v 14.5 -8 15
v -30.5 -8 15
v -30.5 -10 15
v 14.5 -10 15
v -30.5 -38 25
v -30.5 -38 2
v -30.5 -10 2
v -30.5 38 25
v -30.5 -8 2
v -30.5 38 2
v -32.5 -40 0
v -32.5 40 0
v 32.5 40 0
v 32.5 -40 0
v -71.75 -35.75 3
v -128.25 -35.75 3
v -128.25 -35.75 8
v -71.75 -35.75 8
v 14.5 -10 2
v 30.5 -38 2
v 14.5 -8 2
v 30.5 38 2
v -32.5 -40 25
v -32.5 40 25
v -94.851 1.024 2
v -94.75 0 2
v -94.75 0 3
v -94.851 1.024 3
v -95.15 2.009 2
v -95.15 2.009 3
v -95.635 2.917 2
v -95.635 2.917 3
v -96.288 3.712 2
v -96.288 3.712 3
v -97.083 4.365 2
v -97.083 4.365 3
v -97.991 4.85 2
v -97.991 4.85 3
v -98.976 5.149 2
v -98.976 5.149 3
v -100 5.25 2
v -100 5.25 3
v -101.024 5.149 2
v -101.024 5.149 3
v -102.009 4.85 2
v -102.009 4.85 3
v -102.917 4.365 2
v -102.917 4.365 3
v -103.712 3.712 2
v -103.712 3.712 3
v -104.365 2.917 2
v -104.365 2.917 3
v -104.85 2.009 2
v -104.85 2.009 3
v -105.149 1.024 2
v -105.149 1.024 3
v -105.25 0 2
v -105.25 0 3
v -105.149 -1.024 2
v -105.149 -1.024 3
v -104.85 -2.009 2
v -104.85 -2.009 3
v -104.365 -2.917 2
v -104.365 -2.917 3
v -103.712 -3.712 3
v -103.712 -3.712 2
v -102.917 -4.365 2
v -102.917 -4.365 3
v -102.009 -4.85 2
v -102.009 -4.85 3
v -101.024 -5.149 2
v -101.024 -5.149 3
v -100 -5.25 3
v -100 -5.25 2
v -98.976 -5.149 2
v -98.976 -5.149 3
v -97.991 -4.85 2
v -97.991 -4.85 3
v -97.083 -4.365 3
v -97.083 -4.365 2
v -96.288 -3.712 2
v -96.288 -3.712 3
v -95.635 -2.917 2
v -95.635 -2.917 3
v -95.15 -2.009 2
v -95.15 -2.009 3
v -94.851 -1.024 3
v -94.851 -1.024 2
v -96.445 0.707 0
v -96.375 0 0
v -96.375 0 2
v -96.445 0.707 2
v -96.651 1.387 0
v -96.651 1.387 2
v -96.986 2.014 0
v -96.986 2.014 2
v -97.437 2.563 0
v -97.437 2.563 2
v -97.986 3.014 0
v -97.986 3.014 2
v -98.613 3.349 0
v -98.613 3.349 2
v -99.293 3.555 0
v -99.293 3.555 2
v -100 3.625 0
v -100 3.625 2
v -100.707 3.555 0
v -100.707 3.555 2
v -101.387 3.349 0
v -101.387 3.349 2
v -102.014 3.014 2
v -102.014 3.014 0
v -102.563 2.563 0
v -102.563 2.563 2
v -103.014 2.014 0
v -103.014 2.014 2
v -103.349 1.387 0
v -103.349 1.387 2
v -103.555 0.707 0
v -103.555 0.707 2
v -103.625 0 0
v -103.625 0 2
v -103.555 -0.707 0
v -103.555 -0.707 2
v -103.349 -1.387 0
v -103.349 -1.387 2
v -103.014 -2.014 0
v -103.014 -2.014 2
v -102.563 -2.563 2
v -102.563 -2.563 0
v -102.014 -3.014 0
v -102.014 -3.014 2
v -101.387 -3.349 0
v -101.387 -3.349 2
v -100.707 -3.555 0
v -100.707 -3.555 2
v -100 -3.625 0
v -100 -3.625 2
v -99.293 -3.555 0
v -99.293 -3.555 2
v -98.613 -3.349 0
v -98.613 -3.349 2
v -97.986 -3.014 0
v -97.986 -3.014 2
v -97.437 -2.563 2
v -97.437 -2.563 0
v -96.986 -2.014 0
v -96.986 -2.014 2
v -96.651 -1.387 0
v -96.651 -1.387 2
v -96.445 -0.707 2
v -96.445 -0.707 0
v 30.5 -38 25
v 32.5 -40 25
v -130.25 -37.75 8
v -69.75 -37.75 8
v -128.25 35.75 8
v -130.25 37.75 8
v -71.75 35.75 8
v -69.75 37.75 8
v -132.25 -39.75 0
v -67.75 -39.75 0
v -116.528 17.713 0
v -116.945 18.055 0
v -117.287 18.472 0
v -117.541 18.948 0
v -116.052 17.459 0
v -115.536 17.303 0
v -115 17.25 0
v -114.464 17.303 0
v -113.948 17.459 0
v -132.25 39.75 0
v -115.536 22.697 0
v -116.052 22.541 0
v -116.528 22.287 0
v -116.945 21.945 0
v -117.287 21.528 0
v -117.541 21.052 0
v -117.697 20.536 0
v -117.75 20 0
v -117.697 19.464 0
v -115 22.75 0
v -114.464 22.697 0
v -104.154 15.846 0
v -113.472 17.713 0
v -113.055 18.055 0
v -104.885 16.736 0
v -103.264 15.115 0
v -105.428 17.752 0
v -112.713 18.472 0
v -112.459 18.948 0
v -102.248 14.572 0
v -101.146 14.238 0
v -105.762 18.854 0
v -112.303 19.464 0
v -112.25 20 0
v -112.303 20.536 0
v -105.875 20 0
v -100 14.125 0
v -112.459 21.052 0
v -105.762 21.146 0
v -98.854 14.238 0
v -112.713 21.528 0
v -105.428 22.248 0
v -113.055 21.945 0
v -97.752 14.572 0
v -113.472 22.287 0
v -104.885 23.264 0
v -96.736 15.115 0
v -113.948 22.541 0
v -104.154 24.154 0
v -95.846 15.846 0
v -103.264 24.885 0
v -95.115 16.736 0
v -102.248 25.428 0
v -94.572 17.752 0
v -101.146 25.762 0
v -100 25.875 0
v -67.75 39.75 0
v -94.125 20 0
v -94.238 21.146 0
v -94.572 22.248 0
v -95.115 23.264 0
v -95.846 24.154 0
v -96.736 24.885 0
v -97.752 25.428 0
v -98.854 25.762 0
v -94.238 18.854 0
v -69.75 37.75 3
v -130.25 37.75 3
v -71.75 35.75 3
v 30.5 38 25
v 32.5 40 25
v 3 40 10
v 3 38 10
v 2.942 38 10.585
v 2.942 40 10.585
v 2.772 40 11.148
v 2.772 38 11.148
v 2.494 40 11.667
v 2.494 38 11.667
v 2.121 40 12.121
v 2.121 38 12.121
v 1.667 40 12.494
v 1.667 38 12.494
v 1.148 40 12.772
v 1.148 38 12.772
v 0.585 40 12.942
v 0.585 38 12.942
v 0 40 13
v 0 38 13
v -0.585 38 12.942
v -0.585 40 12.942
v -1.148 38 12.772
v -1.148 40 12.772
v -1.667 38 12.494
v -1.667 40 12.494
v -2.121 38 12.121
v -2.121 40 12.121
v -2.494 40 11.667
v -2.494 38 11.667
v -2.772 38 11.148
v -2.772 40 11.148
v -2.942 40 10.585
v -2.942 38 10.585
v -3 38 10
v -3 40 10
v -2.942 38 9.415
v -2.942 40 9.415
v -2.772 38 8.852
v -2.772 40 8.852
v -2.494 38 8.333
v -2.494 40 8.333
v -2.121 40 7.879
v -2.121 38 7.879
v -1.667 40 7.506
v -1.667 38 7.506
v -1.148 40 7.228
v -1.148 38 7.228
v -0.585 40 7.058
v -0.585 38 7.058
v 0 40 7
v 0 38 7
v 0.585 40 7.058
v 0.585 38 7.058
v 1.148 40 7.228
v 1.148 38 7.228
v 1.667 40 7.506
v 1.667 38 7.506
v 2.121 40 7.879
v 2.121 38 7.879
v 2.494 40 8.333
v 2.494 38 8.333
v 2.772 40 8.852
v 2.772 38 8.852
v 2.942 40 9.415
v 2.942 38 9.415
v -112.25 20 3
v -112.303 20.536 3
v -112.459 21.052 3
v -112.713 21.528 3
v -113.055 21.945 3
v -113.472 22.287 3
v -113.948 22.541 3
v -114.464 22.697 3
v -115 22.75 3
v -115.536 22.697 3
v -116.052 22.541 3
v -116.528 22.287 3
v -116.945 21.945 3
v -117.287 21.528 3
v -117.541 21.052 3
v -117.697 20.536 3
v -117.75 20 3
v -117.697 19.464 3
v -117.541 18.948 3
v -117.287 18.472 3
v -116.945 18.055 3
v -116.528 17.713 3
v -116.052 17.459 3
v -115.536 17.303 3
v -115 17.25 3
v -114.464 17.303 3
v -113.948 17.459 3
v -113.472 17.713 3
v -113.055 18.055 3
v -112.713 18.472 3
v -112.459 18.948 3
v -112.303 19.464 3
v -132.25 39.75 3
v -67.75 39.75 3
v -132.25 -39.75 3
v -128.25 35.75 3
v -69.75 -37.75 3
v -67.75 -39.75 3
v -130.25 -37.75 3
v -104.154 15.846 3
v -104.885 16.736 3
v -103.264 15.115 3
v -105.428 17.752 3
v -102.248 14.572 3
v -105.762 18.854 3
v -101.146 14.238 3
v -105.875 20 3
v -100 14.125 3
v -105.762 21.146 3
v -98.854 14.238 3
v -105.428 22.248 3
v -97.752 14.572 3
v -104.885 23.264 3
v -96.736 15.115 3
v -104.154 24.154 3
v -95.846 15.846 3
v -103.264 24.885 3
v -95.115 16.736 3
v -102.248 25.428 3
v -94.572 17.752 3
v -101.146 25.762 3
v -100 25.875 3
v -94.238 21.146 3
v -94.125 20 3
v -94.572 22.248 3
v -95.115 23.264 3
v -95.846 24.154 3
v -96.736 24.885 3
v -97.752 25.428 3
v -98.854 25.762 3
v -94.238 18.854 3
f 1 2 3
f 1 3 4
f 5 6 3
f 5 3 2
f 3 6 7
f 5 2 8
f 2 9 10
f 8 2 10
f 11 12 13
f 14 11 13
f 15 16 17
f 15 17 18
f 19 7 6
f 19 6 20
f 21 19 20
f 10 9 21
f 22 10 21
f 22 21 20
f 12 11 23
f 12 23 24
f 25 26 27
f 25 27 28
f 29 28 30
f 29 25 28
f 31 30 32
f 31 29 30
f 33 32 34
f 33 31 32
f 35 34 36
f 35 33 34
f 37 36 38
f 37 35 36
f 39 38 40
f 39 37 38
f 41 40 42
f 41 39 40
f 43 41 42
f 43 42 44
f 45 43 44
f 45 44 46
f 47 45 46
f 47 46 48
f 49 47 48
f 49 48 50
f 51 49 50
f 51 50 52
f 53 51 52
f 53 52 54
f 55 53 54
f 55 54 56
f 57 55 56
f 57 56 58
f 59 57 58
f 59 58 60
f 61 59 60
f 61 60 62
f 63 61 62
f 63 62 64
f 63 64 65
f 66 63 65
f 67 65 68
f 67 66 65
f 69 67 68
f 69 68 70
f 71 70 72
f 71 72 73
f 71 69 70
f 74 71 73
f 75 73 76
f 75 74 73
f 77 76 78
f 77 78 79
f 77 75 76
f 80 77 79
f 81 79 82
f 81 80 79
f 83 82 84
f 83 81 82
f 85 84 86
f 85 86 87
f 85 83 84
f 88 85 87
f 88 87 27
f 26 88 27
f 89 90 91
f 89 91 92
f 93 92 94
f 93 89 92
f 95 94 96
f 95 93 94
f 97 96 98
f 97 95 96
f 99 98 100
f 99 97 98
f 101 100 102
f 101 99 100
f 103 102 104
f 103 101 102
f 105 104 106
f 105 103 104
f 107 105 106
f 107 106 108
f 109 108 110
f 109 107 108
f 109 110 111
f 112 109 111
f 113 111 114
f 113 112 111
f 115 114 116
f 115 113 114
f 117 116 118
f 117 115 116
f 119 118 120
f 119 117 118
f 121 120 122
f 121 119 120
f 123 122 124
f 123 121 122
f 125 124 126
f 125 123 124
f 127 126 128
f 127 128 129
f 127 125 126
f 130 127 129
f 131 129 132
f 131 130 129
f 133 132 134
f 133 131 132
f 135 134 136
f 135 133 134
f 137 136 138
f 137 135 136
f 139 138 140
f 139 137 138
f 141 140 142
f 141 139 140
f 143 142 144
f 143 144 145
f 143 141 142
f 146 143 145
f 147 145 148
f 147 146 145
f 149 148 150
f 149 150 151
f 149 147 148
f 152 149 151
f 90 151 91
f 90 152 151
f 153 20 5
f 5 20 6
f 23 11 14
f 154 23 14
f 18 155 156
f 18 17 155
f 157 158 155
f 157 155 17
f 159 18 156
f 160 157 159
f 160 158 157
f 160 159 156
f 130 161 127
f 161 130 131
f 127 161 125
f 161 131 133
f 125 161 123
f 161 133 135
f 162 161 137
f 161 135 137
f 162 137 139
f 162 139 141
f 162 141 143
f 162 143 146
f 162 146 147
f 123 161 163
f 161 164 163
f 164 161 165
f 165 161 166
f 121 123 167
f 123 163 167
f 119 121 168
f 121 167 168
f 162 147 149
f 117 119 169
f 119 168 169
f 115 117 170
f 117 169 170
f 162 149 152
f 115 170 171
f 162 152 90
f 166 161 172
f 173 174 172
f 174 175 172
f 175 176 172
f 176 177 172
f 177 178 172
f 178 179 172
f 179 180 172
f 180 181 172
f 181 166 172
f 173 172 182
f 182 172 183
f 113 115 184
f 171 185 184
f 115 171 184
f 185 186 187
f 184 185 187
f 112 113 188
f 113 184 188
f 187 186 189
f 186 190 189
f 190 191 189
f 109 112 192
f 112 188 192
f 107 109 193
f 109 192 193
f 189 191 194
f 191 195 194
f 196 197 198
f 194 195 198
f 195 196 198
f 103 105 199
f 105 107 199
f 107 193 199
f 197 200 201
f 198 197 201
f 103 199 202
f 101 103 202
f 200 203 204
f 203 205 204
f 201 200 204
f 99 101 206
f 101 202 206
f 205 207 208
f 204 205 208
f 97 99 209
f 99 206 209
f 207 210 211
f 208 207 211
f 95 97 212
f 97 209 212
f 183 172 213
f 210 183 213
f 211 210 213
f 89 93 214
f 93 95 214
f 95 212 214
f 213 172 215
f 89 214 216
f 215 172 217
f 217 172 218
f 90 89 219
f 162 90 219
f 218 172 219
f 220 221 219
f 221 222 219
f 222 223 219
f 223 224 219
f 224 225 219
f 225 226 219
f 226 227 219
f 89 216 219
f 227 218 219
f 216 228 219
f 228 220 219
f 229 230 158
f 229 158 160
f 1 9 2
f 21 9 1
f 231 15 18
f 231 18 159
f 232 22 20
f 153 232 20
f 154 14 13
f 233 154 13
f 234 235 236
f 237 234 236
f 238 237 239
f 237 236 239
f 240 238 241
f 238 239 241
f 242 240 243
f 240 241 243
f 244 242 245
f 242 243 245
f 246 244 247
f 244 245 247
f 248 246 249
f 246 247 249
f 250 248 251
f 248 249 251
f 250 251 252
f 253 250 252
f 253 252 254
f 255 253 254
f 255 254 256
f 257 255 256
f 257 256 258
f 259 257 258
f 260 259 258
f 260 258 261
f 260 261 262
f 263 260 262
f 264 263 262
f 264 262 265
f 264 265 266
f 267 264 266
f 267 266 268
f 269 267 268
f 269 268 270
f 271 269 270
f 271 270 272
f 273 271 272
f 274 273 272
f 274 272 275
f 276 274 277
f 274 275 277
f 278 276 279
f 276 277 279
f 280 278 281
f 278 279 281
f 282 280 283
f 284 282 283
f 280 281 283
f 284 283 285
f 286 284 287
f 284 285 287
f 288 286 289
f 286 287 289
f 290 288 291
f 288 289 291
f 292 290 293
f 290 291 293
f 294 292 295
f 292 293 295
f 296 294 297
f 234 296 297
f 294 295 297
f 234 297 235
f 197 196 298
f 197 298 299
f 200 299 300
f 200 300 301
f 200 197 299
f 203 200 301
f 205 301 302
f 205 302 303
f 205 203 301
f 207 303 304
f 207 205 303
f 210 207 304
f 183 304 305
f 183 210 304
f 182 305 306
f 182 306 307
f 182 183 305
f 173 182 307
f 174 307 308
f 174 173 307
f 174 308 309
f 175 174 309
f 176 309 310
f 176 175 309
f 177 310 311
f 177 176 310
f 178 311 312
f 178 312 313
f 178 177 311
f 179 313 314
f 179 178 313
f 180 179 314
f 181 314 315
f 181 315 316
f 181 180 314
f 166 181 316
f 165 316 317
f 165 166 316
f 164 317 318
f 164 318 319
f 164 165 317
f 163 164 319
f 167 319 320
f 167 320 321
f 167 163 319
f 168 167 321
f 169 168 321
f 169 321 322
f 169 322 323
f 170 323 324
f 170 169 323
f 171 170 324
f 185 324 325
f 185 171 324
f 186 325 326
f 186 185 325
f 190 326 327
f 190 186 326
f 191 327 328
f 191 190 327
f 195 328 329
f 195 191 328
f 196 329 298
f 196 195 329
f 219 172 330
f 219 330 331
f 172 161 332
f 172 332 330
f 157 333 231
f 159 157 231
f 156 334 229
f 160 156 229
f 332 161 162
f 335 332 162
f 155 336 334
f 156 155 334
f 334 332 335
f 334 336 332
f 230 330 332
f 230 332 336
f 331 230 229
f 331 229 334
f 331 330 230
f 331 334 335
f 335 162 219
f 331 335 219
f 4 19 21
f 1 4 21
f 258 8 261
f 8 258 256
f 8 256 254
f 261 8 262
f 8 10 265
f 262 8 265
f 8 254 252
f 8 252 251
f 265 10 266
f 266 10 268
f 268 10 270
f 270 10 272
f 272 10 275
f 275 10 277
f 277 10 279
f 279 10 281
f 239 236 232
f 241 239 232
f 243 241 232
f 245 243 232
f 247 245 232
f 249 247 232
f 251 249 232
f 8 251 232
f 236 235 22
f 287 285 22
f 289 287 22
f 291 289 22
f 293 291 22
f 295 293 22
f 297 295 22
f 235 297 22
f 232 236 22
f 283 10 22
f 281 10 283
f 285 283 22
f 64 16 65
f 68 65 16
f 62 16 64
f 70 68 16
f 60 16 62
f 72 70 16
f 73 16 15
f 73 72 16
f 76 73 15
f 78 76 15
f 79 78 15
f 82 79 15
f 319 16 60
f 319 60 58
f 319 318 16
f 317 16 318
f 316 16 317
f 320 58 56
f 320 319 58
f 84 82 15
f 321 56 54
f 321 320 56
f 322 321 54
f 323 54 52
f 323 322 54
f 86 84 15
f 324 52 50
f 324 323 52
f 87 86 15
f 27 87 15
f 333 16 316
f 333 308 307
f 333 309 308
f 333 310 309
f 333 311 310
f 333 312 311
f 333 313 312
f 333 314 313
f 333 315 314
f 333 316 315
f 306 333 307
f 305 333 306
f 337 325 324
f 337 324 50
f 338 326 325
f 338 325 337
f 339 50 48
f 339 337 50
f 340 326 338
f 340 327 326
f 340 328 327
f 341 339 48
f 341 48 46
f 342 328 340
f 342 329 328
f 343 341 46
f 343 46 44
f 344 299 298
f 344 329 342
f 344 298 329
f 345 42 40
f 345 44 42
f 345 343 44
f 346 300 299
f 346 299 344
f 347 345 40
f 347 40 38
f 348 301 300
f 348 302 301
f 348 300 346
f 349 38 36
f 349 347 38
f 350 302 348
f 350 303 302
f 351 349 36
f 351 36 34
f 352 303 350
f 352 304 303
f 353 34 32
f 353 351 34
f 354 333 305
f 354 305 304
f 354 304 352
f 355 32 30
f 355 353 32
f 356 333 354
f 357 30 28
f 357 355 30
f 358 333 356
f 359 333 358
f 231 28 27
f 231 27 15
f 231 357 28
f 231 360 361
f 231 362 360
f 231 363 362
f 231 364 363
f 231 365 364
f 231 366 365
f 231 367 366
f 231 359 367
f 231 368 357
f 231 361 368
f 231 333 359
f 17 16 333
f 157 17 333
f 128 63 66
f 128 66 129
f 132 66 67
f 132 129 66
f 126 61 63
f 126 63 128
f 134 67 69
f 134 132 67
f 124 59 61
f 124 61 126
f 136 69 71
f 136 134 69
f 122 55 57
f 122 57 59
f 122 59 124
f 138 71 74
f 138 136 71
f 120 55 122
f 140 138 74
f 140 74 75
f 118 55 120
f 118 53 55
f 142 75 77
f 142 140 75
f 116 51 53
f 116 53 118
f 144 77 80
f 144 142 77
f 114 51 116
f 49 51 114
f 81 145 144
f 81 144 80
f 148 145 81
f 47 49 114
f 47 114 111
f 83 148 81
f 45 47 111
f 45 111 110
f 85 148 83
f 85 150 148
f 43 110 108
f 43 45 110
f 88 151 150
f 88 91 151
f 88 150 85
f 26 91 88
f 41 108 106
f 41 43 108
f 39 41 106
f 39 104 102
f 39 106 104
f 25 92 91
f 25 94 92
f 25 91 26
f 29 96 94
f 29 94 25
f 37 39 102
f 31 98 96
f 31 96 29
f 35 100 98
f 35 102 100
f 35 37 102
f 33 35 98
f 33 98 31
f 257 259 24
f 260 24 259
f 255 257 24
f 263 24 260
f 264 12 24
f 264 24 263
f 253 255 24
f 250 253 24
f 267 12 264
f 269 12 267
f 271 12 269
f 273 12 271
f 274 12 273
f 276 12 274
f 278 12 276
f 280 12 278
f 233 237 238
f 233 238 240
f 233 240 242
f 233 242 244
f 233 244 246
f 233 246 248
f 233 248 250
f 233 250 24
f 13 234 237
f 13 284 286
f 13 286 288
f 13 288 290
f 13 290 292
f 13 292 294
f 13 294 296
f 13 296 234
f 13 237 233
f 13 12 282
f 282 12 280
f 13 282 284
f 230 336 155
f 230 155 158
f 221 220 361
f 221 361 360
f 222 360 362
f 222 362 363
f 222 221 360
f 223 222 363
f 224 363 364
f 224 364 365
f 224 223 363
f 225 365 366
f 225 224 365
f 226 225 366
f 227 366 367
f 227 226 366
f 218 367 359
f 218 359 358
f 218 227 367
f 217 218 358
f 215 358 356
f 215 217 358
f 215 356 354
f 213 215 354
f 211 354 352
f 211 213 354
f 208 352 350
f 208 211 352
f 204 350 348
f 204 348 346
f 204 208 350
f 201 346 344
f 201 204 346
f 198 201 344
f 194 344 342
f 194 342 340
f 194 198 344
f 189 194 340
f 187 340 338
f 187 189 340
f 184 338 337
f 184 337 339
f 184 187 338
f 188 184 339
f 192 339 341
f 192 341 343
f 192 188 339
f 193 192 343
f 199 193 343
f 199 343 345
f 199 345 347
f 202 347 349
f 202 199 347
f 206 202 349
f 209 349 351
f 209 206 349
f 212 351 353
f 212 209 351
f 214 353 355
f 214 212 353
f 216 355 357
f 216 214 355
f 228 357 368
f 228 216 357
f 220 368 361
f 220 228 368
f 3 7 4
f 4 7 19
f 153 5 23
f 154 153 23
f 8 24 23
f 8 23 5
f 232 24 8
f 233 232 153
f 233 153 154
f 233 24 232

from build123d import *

# Parameters (mm, degrees)
F1_DEPTH = 2
F0_W     = 65
F0_H     = 80
F2_DEPTH = 25
F0_W_2   = 45
F0_H_2   = 2
F3_DEPTH = 15
F0_W_3   = 56.5
F0_H_3   = 71.5
F0_R     = 5.25
F0_R_2   = 2.75
F0_R_3   = 5.875
F4_DEPTH = 3
F0_W_4   = 64.5
F0_H_4   = 79.5
F0_W_5   = 60.5
F0_H_5   = 75.5
F5_DEPTH = 8
F0_R_4   = 3.625
F6_DEPTH = 2
F7_R     = 3
F8_DEPTH = 47.8


with BuildPart() as f1:
    # F0 (on Top) → F1 (new body)
    with BuildSketch(Plane.XY):
        Polygon((30.5, 38), (-30.5, 38), (-30.5, -8), (14.5, -8), (14.5, -10), (-30.5, -10), (-30.5, -38), (30.5, -38), align=None)
    extrude(amount=F1_DEPTH)

    # F0 (on Top) → F2 (join)
    with BuildSketch(Plane.XY):
        Rectangle(F0_W, F0_H)
        Polygon((-30.5, -8), (-30.5, 38), (30.5, 38), (30.5, -38), (-30.5, -38), (-30.5, -10), align=None, mode=Mode.SUBTRACT)
    extrude(amount=F2_DEPTH)

    # F0 (on Top) → F3 (join)
    with BuildSketch(Plane.XY):
        with Locations((-8, -9)):
            Rectangle(F0_W_2, F0_H_2)
    extrude(amount=F3_DEPTH)

    # F7 (on Front) → F8 (cut)
    with BuildSketch(Plane.XZ):
        with Locations((0, 10)):
            Circle(F7_R)
    extrude(amount=-F8_DEPTH, mode=Mode.SUBTRACT)


with BuildPart() as f4:
    # F0 (on Top) → F4 (new body)
    with BuildSketch(Plane.XY):
        with Locations((-100, 0)):
            Rectangle(F0_W_3, F0_H_3)
        with Locations((-100, 0)):
            Circle(F0_R, mode=Mode.SUBTRACT)
        with Locations((-115, 20)):
            Circle(F0_R_2, mode=Mode.SUBTRACT)
        with Locations((-100, 20)):
            Circle(F0_R_3, mode=Mode.SUBTRACT)
    extrude(amount=F4_DEPTH)



with BuildPart() as f4b:
    # F0 (on Top) → F4, piece 2 (new body)
    with BuildSketch(Plane.XY):
        with Locations((-100, 0)):
            Rectangle(F0_W_4, F0_H_4)
        with Locations((-100, 0)):
            Rectangle(F0_W_5, F0_H_5, mode=Mode.SUBTRACT)
    extrude(amount=F4_DEPTH)


with BuildPart() as f4_1:
    add(f4.part)

    add(f4b.part)  # F5 merges F4b
    # F0 (on Top) → F5 (join)
    with BuildSketch(Plane.XY):
        with Locations((-100, 0)):
            Rectangle(F0_W_5, F0_H_5)
        with Locations((-100, 0)):
            Rectangle(F0_W_3, F0_H_3, mode=Mode.SUBTRACT)
    extrude(amount=F5_DEPTH)

    # F0 (on Top) → F6 (join)
    with BuildSketch(Plane.XY):
        with Locations((-100, 0)):
            Circle(F0_R)
        with Locations((-100, 0)):
            Circle(F0_R_4, mode=Mode.SUBTRACT)
    extrude(amount=F6_DEPTH)


solid = Compound([f1.part, f4_1.part])
